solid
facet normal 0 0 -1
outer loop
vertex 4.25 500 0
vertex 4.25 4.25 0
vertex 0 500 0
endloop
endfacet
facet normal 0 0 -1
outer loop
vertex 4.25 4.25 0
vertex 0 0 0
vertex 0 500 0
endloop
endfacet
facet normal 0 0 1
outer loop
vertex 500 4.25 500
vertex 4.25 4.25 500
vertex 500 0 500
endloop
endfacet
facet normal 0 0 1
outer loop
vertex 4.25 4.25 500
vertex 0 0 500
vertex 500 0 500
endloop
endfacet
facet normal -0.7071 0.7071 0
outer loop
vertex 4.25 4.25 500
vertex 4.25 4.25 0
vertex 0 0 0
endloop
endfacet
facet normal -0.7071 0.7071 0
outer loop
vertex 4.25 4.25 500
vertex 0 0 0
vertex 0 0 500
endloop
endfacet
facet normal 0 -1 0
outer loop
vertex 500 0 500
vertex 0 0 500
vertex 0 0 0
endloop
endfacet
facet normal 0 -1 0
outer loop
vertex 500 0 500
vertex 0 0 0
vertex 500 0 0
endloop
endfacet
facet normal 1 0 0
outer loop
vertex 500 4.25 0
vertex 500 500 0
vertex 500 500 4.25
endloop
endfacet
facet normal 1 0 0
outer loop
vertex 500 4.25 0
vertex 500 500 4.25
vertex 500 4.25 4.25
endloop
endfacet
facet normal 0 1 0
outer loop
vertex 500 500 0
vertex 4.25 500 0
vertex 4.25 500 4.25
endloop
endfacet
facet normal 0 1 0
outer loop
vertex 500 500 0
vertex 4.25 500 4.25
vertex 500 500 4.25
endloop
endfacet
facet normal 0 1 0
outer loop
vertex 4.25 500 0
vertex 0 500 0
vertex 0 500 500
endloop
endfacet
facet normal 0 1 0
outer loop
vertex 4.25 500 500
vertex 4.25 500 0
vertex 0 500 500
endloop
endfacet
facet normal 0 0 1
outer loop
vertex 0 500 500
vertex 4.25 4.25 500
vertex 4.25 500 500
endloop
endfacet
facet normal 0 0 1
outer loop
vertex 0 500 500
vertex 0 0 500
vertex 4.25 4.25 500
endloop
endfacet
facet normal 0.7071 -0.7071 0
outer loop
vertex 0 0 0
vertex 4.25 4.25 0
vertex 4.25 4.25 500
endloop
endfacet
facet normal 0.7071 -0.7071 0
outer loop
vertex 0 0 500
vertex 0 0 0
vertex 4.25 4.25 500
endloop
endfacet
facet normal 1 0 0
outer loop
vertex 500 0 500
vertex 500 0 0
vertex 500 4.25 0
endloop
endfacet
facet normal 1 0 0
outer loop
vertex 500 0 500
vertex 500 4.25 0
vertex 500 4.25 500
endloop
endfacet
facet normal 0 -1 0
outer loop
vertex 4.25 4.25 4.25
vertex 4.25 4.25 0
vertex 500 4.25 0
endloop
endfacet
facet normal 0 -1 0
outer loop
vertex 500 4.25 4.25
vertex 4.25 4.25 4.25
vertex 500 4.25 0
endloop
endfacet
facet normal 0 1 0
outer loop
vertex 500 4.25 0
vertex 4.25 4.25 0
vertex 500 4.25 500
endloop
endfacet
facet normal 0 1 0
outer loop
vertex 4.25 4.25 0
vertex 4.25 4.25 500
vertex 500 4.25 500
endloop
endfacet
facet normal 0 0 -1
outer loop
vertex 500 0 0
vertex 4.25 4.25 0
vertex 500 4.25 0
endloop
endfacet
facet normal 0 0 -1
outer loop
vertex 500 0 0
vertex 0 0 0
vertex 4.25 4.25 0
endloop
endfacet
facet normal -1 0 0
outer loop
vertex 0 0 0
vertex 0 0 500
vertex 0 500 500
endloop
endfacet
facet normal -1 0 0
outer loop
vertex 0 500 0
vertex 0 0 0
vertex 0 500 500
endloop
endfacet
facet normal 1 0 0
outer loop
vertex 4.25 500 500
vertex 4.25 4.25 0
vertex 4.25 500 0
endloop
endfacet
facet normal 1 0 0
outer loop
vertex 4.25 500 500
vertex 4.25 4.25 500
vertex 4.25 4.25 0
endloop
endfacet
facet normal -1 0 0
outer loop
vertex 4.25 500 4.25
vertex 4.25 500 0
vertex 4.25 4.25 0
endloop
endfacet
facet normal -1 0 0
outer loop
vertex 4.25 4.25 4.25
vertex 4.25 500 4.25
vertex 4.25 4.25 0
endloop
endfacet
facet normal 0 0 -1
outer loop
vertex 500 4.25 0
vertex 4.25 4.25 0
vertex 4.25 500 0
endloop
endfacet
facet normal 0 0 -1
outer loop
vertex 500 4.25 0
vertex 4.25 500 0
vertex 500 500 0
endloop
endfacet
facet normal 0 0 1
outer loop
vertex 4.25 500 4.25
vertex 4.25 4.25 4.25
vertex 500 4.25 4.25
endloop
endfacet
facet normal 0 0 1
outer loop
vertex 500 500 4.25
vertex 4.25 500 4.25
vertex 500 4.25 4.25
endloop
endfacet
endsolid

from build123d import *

# Parameters (mm, degrees)
F1_W      = 500
F1_H      = 500
F2_DEPTH  = 4.25
F3_W      = 500
F3_H      = 500
F4_DEPTH  = 4.25
F5_SIZE   = 4.24999
F5_2_SIZE = 4.24999
F6_W      = 495.75
F6_H      = 495.75
F7_DEPTH  = 4.25


# Not quite as in the source:
# - a fillet or chamfer is up to 0.001 mm smaller than in the source, because OpenCascade refuses the exact size


with BuildPart() as f2:
    # F1 (on Right) → F2 (new body)
    with BuildSketch(Plane.YZ):
        with Locations((250, 250)):
            Rectangle(F1_W, F1_H)
    extrude(amount=F2_DEPTH)

    # F5 (size 4.25 in the source; OpenCascade refuses exactly that, so slightly less here)
    f5_edges = [f2.edges().sort_by_distance(p)[0] for p in [
        (4.25, 0, 250),
    ]]
    chamfer(f5_edges, length=F5_SIZE)


with BuildPart() as f4:
    # F3 (on Front) → F4 (new body)
    with BuildSketch(Plane.XZ):
        with Locations((250, 250)):
            Rectangle(F3_W, F3_H)
    extrude(amount=-F4_DEPTH)

    # F5#2 (size 4.25 in the source; OpenCascade refuses exactly that, so slightly less here)
    f5_2_edges = [f4.edges().sort_by_distance(p)[0] for p in [
        (0, 4.25, 250),
    ]]
    chamfer(f5_2_edges, length=F5_2_SIZE)


with BuildPart() as f7:
    # F6 (on face) → F7 (new body)
    with BuildSketch(Plane(origin=(0, 0, 0), x_dir=(1, 0, 0), z_dir=(0, 0, -1))):
        with Locations((252.125, -252.125)):
            Rectangle(F6_W, F6_H)
    extrude(amount=-F7_DEPTH)


solid = Compound([f2.part, f4.part, f7.part])
